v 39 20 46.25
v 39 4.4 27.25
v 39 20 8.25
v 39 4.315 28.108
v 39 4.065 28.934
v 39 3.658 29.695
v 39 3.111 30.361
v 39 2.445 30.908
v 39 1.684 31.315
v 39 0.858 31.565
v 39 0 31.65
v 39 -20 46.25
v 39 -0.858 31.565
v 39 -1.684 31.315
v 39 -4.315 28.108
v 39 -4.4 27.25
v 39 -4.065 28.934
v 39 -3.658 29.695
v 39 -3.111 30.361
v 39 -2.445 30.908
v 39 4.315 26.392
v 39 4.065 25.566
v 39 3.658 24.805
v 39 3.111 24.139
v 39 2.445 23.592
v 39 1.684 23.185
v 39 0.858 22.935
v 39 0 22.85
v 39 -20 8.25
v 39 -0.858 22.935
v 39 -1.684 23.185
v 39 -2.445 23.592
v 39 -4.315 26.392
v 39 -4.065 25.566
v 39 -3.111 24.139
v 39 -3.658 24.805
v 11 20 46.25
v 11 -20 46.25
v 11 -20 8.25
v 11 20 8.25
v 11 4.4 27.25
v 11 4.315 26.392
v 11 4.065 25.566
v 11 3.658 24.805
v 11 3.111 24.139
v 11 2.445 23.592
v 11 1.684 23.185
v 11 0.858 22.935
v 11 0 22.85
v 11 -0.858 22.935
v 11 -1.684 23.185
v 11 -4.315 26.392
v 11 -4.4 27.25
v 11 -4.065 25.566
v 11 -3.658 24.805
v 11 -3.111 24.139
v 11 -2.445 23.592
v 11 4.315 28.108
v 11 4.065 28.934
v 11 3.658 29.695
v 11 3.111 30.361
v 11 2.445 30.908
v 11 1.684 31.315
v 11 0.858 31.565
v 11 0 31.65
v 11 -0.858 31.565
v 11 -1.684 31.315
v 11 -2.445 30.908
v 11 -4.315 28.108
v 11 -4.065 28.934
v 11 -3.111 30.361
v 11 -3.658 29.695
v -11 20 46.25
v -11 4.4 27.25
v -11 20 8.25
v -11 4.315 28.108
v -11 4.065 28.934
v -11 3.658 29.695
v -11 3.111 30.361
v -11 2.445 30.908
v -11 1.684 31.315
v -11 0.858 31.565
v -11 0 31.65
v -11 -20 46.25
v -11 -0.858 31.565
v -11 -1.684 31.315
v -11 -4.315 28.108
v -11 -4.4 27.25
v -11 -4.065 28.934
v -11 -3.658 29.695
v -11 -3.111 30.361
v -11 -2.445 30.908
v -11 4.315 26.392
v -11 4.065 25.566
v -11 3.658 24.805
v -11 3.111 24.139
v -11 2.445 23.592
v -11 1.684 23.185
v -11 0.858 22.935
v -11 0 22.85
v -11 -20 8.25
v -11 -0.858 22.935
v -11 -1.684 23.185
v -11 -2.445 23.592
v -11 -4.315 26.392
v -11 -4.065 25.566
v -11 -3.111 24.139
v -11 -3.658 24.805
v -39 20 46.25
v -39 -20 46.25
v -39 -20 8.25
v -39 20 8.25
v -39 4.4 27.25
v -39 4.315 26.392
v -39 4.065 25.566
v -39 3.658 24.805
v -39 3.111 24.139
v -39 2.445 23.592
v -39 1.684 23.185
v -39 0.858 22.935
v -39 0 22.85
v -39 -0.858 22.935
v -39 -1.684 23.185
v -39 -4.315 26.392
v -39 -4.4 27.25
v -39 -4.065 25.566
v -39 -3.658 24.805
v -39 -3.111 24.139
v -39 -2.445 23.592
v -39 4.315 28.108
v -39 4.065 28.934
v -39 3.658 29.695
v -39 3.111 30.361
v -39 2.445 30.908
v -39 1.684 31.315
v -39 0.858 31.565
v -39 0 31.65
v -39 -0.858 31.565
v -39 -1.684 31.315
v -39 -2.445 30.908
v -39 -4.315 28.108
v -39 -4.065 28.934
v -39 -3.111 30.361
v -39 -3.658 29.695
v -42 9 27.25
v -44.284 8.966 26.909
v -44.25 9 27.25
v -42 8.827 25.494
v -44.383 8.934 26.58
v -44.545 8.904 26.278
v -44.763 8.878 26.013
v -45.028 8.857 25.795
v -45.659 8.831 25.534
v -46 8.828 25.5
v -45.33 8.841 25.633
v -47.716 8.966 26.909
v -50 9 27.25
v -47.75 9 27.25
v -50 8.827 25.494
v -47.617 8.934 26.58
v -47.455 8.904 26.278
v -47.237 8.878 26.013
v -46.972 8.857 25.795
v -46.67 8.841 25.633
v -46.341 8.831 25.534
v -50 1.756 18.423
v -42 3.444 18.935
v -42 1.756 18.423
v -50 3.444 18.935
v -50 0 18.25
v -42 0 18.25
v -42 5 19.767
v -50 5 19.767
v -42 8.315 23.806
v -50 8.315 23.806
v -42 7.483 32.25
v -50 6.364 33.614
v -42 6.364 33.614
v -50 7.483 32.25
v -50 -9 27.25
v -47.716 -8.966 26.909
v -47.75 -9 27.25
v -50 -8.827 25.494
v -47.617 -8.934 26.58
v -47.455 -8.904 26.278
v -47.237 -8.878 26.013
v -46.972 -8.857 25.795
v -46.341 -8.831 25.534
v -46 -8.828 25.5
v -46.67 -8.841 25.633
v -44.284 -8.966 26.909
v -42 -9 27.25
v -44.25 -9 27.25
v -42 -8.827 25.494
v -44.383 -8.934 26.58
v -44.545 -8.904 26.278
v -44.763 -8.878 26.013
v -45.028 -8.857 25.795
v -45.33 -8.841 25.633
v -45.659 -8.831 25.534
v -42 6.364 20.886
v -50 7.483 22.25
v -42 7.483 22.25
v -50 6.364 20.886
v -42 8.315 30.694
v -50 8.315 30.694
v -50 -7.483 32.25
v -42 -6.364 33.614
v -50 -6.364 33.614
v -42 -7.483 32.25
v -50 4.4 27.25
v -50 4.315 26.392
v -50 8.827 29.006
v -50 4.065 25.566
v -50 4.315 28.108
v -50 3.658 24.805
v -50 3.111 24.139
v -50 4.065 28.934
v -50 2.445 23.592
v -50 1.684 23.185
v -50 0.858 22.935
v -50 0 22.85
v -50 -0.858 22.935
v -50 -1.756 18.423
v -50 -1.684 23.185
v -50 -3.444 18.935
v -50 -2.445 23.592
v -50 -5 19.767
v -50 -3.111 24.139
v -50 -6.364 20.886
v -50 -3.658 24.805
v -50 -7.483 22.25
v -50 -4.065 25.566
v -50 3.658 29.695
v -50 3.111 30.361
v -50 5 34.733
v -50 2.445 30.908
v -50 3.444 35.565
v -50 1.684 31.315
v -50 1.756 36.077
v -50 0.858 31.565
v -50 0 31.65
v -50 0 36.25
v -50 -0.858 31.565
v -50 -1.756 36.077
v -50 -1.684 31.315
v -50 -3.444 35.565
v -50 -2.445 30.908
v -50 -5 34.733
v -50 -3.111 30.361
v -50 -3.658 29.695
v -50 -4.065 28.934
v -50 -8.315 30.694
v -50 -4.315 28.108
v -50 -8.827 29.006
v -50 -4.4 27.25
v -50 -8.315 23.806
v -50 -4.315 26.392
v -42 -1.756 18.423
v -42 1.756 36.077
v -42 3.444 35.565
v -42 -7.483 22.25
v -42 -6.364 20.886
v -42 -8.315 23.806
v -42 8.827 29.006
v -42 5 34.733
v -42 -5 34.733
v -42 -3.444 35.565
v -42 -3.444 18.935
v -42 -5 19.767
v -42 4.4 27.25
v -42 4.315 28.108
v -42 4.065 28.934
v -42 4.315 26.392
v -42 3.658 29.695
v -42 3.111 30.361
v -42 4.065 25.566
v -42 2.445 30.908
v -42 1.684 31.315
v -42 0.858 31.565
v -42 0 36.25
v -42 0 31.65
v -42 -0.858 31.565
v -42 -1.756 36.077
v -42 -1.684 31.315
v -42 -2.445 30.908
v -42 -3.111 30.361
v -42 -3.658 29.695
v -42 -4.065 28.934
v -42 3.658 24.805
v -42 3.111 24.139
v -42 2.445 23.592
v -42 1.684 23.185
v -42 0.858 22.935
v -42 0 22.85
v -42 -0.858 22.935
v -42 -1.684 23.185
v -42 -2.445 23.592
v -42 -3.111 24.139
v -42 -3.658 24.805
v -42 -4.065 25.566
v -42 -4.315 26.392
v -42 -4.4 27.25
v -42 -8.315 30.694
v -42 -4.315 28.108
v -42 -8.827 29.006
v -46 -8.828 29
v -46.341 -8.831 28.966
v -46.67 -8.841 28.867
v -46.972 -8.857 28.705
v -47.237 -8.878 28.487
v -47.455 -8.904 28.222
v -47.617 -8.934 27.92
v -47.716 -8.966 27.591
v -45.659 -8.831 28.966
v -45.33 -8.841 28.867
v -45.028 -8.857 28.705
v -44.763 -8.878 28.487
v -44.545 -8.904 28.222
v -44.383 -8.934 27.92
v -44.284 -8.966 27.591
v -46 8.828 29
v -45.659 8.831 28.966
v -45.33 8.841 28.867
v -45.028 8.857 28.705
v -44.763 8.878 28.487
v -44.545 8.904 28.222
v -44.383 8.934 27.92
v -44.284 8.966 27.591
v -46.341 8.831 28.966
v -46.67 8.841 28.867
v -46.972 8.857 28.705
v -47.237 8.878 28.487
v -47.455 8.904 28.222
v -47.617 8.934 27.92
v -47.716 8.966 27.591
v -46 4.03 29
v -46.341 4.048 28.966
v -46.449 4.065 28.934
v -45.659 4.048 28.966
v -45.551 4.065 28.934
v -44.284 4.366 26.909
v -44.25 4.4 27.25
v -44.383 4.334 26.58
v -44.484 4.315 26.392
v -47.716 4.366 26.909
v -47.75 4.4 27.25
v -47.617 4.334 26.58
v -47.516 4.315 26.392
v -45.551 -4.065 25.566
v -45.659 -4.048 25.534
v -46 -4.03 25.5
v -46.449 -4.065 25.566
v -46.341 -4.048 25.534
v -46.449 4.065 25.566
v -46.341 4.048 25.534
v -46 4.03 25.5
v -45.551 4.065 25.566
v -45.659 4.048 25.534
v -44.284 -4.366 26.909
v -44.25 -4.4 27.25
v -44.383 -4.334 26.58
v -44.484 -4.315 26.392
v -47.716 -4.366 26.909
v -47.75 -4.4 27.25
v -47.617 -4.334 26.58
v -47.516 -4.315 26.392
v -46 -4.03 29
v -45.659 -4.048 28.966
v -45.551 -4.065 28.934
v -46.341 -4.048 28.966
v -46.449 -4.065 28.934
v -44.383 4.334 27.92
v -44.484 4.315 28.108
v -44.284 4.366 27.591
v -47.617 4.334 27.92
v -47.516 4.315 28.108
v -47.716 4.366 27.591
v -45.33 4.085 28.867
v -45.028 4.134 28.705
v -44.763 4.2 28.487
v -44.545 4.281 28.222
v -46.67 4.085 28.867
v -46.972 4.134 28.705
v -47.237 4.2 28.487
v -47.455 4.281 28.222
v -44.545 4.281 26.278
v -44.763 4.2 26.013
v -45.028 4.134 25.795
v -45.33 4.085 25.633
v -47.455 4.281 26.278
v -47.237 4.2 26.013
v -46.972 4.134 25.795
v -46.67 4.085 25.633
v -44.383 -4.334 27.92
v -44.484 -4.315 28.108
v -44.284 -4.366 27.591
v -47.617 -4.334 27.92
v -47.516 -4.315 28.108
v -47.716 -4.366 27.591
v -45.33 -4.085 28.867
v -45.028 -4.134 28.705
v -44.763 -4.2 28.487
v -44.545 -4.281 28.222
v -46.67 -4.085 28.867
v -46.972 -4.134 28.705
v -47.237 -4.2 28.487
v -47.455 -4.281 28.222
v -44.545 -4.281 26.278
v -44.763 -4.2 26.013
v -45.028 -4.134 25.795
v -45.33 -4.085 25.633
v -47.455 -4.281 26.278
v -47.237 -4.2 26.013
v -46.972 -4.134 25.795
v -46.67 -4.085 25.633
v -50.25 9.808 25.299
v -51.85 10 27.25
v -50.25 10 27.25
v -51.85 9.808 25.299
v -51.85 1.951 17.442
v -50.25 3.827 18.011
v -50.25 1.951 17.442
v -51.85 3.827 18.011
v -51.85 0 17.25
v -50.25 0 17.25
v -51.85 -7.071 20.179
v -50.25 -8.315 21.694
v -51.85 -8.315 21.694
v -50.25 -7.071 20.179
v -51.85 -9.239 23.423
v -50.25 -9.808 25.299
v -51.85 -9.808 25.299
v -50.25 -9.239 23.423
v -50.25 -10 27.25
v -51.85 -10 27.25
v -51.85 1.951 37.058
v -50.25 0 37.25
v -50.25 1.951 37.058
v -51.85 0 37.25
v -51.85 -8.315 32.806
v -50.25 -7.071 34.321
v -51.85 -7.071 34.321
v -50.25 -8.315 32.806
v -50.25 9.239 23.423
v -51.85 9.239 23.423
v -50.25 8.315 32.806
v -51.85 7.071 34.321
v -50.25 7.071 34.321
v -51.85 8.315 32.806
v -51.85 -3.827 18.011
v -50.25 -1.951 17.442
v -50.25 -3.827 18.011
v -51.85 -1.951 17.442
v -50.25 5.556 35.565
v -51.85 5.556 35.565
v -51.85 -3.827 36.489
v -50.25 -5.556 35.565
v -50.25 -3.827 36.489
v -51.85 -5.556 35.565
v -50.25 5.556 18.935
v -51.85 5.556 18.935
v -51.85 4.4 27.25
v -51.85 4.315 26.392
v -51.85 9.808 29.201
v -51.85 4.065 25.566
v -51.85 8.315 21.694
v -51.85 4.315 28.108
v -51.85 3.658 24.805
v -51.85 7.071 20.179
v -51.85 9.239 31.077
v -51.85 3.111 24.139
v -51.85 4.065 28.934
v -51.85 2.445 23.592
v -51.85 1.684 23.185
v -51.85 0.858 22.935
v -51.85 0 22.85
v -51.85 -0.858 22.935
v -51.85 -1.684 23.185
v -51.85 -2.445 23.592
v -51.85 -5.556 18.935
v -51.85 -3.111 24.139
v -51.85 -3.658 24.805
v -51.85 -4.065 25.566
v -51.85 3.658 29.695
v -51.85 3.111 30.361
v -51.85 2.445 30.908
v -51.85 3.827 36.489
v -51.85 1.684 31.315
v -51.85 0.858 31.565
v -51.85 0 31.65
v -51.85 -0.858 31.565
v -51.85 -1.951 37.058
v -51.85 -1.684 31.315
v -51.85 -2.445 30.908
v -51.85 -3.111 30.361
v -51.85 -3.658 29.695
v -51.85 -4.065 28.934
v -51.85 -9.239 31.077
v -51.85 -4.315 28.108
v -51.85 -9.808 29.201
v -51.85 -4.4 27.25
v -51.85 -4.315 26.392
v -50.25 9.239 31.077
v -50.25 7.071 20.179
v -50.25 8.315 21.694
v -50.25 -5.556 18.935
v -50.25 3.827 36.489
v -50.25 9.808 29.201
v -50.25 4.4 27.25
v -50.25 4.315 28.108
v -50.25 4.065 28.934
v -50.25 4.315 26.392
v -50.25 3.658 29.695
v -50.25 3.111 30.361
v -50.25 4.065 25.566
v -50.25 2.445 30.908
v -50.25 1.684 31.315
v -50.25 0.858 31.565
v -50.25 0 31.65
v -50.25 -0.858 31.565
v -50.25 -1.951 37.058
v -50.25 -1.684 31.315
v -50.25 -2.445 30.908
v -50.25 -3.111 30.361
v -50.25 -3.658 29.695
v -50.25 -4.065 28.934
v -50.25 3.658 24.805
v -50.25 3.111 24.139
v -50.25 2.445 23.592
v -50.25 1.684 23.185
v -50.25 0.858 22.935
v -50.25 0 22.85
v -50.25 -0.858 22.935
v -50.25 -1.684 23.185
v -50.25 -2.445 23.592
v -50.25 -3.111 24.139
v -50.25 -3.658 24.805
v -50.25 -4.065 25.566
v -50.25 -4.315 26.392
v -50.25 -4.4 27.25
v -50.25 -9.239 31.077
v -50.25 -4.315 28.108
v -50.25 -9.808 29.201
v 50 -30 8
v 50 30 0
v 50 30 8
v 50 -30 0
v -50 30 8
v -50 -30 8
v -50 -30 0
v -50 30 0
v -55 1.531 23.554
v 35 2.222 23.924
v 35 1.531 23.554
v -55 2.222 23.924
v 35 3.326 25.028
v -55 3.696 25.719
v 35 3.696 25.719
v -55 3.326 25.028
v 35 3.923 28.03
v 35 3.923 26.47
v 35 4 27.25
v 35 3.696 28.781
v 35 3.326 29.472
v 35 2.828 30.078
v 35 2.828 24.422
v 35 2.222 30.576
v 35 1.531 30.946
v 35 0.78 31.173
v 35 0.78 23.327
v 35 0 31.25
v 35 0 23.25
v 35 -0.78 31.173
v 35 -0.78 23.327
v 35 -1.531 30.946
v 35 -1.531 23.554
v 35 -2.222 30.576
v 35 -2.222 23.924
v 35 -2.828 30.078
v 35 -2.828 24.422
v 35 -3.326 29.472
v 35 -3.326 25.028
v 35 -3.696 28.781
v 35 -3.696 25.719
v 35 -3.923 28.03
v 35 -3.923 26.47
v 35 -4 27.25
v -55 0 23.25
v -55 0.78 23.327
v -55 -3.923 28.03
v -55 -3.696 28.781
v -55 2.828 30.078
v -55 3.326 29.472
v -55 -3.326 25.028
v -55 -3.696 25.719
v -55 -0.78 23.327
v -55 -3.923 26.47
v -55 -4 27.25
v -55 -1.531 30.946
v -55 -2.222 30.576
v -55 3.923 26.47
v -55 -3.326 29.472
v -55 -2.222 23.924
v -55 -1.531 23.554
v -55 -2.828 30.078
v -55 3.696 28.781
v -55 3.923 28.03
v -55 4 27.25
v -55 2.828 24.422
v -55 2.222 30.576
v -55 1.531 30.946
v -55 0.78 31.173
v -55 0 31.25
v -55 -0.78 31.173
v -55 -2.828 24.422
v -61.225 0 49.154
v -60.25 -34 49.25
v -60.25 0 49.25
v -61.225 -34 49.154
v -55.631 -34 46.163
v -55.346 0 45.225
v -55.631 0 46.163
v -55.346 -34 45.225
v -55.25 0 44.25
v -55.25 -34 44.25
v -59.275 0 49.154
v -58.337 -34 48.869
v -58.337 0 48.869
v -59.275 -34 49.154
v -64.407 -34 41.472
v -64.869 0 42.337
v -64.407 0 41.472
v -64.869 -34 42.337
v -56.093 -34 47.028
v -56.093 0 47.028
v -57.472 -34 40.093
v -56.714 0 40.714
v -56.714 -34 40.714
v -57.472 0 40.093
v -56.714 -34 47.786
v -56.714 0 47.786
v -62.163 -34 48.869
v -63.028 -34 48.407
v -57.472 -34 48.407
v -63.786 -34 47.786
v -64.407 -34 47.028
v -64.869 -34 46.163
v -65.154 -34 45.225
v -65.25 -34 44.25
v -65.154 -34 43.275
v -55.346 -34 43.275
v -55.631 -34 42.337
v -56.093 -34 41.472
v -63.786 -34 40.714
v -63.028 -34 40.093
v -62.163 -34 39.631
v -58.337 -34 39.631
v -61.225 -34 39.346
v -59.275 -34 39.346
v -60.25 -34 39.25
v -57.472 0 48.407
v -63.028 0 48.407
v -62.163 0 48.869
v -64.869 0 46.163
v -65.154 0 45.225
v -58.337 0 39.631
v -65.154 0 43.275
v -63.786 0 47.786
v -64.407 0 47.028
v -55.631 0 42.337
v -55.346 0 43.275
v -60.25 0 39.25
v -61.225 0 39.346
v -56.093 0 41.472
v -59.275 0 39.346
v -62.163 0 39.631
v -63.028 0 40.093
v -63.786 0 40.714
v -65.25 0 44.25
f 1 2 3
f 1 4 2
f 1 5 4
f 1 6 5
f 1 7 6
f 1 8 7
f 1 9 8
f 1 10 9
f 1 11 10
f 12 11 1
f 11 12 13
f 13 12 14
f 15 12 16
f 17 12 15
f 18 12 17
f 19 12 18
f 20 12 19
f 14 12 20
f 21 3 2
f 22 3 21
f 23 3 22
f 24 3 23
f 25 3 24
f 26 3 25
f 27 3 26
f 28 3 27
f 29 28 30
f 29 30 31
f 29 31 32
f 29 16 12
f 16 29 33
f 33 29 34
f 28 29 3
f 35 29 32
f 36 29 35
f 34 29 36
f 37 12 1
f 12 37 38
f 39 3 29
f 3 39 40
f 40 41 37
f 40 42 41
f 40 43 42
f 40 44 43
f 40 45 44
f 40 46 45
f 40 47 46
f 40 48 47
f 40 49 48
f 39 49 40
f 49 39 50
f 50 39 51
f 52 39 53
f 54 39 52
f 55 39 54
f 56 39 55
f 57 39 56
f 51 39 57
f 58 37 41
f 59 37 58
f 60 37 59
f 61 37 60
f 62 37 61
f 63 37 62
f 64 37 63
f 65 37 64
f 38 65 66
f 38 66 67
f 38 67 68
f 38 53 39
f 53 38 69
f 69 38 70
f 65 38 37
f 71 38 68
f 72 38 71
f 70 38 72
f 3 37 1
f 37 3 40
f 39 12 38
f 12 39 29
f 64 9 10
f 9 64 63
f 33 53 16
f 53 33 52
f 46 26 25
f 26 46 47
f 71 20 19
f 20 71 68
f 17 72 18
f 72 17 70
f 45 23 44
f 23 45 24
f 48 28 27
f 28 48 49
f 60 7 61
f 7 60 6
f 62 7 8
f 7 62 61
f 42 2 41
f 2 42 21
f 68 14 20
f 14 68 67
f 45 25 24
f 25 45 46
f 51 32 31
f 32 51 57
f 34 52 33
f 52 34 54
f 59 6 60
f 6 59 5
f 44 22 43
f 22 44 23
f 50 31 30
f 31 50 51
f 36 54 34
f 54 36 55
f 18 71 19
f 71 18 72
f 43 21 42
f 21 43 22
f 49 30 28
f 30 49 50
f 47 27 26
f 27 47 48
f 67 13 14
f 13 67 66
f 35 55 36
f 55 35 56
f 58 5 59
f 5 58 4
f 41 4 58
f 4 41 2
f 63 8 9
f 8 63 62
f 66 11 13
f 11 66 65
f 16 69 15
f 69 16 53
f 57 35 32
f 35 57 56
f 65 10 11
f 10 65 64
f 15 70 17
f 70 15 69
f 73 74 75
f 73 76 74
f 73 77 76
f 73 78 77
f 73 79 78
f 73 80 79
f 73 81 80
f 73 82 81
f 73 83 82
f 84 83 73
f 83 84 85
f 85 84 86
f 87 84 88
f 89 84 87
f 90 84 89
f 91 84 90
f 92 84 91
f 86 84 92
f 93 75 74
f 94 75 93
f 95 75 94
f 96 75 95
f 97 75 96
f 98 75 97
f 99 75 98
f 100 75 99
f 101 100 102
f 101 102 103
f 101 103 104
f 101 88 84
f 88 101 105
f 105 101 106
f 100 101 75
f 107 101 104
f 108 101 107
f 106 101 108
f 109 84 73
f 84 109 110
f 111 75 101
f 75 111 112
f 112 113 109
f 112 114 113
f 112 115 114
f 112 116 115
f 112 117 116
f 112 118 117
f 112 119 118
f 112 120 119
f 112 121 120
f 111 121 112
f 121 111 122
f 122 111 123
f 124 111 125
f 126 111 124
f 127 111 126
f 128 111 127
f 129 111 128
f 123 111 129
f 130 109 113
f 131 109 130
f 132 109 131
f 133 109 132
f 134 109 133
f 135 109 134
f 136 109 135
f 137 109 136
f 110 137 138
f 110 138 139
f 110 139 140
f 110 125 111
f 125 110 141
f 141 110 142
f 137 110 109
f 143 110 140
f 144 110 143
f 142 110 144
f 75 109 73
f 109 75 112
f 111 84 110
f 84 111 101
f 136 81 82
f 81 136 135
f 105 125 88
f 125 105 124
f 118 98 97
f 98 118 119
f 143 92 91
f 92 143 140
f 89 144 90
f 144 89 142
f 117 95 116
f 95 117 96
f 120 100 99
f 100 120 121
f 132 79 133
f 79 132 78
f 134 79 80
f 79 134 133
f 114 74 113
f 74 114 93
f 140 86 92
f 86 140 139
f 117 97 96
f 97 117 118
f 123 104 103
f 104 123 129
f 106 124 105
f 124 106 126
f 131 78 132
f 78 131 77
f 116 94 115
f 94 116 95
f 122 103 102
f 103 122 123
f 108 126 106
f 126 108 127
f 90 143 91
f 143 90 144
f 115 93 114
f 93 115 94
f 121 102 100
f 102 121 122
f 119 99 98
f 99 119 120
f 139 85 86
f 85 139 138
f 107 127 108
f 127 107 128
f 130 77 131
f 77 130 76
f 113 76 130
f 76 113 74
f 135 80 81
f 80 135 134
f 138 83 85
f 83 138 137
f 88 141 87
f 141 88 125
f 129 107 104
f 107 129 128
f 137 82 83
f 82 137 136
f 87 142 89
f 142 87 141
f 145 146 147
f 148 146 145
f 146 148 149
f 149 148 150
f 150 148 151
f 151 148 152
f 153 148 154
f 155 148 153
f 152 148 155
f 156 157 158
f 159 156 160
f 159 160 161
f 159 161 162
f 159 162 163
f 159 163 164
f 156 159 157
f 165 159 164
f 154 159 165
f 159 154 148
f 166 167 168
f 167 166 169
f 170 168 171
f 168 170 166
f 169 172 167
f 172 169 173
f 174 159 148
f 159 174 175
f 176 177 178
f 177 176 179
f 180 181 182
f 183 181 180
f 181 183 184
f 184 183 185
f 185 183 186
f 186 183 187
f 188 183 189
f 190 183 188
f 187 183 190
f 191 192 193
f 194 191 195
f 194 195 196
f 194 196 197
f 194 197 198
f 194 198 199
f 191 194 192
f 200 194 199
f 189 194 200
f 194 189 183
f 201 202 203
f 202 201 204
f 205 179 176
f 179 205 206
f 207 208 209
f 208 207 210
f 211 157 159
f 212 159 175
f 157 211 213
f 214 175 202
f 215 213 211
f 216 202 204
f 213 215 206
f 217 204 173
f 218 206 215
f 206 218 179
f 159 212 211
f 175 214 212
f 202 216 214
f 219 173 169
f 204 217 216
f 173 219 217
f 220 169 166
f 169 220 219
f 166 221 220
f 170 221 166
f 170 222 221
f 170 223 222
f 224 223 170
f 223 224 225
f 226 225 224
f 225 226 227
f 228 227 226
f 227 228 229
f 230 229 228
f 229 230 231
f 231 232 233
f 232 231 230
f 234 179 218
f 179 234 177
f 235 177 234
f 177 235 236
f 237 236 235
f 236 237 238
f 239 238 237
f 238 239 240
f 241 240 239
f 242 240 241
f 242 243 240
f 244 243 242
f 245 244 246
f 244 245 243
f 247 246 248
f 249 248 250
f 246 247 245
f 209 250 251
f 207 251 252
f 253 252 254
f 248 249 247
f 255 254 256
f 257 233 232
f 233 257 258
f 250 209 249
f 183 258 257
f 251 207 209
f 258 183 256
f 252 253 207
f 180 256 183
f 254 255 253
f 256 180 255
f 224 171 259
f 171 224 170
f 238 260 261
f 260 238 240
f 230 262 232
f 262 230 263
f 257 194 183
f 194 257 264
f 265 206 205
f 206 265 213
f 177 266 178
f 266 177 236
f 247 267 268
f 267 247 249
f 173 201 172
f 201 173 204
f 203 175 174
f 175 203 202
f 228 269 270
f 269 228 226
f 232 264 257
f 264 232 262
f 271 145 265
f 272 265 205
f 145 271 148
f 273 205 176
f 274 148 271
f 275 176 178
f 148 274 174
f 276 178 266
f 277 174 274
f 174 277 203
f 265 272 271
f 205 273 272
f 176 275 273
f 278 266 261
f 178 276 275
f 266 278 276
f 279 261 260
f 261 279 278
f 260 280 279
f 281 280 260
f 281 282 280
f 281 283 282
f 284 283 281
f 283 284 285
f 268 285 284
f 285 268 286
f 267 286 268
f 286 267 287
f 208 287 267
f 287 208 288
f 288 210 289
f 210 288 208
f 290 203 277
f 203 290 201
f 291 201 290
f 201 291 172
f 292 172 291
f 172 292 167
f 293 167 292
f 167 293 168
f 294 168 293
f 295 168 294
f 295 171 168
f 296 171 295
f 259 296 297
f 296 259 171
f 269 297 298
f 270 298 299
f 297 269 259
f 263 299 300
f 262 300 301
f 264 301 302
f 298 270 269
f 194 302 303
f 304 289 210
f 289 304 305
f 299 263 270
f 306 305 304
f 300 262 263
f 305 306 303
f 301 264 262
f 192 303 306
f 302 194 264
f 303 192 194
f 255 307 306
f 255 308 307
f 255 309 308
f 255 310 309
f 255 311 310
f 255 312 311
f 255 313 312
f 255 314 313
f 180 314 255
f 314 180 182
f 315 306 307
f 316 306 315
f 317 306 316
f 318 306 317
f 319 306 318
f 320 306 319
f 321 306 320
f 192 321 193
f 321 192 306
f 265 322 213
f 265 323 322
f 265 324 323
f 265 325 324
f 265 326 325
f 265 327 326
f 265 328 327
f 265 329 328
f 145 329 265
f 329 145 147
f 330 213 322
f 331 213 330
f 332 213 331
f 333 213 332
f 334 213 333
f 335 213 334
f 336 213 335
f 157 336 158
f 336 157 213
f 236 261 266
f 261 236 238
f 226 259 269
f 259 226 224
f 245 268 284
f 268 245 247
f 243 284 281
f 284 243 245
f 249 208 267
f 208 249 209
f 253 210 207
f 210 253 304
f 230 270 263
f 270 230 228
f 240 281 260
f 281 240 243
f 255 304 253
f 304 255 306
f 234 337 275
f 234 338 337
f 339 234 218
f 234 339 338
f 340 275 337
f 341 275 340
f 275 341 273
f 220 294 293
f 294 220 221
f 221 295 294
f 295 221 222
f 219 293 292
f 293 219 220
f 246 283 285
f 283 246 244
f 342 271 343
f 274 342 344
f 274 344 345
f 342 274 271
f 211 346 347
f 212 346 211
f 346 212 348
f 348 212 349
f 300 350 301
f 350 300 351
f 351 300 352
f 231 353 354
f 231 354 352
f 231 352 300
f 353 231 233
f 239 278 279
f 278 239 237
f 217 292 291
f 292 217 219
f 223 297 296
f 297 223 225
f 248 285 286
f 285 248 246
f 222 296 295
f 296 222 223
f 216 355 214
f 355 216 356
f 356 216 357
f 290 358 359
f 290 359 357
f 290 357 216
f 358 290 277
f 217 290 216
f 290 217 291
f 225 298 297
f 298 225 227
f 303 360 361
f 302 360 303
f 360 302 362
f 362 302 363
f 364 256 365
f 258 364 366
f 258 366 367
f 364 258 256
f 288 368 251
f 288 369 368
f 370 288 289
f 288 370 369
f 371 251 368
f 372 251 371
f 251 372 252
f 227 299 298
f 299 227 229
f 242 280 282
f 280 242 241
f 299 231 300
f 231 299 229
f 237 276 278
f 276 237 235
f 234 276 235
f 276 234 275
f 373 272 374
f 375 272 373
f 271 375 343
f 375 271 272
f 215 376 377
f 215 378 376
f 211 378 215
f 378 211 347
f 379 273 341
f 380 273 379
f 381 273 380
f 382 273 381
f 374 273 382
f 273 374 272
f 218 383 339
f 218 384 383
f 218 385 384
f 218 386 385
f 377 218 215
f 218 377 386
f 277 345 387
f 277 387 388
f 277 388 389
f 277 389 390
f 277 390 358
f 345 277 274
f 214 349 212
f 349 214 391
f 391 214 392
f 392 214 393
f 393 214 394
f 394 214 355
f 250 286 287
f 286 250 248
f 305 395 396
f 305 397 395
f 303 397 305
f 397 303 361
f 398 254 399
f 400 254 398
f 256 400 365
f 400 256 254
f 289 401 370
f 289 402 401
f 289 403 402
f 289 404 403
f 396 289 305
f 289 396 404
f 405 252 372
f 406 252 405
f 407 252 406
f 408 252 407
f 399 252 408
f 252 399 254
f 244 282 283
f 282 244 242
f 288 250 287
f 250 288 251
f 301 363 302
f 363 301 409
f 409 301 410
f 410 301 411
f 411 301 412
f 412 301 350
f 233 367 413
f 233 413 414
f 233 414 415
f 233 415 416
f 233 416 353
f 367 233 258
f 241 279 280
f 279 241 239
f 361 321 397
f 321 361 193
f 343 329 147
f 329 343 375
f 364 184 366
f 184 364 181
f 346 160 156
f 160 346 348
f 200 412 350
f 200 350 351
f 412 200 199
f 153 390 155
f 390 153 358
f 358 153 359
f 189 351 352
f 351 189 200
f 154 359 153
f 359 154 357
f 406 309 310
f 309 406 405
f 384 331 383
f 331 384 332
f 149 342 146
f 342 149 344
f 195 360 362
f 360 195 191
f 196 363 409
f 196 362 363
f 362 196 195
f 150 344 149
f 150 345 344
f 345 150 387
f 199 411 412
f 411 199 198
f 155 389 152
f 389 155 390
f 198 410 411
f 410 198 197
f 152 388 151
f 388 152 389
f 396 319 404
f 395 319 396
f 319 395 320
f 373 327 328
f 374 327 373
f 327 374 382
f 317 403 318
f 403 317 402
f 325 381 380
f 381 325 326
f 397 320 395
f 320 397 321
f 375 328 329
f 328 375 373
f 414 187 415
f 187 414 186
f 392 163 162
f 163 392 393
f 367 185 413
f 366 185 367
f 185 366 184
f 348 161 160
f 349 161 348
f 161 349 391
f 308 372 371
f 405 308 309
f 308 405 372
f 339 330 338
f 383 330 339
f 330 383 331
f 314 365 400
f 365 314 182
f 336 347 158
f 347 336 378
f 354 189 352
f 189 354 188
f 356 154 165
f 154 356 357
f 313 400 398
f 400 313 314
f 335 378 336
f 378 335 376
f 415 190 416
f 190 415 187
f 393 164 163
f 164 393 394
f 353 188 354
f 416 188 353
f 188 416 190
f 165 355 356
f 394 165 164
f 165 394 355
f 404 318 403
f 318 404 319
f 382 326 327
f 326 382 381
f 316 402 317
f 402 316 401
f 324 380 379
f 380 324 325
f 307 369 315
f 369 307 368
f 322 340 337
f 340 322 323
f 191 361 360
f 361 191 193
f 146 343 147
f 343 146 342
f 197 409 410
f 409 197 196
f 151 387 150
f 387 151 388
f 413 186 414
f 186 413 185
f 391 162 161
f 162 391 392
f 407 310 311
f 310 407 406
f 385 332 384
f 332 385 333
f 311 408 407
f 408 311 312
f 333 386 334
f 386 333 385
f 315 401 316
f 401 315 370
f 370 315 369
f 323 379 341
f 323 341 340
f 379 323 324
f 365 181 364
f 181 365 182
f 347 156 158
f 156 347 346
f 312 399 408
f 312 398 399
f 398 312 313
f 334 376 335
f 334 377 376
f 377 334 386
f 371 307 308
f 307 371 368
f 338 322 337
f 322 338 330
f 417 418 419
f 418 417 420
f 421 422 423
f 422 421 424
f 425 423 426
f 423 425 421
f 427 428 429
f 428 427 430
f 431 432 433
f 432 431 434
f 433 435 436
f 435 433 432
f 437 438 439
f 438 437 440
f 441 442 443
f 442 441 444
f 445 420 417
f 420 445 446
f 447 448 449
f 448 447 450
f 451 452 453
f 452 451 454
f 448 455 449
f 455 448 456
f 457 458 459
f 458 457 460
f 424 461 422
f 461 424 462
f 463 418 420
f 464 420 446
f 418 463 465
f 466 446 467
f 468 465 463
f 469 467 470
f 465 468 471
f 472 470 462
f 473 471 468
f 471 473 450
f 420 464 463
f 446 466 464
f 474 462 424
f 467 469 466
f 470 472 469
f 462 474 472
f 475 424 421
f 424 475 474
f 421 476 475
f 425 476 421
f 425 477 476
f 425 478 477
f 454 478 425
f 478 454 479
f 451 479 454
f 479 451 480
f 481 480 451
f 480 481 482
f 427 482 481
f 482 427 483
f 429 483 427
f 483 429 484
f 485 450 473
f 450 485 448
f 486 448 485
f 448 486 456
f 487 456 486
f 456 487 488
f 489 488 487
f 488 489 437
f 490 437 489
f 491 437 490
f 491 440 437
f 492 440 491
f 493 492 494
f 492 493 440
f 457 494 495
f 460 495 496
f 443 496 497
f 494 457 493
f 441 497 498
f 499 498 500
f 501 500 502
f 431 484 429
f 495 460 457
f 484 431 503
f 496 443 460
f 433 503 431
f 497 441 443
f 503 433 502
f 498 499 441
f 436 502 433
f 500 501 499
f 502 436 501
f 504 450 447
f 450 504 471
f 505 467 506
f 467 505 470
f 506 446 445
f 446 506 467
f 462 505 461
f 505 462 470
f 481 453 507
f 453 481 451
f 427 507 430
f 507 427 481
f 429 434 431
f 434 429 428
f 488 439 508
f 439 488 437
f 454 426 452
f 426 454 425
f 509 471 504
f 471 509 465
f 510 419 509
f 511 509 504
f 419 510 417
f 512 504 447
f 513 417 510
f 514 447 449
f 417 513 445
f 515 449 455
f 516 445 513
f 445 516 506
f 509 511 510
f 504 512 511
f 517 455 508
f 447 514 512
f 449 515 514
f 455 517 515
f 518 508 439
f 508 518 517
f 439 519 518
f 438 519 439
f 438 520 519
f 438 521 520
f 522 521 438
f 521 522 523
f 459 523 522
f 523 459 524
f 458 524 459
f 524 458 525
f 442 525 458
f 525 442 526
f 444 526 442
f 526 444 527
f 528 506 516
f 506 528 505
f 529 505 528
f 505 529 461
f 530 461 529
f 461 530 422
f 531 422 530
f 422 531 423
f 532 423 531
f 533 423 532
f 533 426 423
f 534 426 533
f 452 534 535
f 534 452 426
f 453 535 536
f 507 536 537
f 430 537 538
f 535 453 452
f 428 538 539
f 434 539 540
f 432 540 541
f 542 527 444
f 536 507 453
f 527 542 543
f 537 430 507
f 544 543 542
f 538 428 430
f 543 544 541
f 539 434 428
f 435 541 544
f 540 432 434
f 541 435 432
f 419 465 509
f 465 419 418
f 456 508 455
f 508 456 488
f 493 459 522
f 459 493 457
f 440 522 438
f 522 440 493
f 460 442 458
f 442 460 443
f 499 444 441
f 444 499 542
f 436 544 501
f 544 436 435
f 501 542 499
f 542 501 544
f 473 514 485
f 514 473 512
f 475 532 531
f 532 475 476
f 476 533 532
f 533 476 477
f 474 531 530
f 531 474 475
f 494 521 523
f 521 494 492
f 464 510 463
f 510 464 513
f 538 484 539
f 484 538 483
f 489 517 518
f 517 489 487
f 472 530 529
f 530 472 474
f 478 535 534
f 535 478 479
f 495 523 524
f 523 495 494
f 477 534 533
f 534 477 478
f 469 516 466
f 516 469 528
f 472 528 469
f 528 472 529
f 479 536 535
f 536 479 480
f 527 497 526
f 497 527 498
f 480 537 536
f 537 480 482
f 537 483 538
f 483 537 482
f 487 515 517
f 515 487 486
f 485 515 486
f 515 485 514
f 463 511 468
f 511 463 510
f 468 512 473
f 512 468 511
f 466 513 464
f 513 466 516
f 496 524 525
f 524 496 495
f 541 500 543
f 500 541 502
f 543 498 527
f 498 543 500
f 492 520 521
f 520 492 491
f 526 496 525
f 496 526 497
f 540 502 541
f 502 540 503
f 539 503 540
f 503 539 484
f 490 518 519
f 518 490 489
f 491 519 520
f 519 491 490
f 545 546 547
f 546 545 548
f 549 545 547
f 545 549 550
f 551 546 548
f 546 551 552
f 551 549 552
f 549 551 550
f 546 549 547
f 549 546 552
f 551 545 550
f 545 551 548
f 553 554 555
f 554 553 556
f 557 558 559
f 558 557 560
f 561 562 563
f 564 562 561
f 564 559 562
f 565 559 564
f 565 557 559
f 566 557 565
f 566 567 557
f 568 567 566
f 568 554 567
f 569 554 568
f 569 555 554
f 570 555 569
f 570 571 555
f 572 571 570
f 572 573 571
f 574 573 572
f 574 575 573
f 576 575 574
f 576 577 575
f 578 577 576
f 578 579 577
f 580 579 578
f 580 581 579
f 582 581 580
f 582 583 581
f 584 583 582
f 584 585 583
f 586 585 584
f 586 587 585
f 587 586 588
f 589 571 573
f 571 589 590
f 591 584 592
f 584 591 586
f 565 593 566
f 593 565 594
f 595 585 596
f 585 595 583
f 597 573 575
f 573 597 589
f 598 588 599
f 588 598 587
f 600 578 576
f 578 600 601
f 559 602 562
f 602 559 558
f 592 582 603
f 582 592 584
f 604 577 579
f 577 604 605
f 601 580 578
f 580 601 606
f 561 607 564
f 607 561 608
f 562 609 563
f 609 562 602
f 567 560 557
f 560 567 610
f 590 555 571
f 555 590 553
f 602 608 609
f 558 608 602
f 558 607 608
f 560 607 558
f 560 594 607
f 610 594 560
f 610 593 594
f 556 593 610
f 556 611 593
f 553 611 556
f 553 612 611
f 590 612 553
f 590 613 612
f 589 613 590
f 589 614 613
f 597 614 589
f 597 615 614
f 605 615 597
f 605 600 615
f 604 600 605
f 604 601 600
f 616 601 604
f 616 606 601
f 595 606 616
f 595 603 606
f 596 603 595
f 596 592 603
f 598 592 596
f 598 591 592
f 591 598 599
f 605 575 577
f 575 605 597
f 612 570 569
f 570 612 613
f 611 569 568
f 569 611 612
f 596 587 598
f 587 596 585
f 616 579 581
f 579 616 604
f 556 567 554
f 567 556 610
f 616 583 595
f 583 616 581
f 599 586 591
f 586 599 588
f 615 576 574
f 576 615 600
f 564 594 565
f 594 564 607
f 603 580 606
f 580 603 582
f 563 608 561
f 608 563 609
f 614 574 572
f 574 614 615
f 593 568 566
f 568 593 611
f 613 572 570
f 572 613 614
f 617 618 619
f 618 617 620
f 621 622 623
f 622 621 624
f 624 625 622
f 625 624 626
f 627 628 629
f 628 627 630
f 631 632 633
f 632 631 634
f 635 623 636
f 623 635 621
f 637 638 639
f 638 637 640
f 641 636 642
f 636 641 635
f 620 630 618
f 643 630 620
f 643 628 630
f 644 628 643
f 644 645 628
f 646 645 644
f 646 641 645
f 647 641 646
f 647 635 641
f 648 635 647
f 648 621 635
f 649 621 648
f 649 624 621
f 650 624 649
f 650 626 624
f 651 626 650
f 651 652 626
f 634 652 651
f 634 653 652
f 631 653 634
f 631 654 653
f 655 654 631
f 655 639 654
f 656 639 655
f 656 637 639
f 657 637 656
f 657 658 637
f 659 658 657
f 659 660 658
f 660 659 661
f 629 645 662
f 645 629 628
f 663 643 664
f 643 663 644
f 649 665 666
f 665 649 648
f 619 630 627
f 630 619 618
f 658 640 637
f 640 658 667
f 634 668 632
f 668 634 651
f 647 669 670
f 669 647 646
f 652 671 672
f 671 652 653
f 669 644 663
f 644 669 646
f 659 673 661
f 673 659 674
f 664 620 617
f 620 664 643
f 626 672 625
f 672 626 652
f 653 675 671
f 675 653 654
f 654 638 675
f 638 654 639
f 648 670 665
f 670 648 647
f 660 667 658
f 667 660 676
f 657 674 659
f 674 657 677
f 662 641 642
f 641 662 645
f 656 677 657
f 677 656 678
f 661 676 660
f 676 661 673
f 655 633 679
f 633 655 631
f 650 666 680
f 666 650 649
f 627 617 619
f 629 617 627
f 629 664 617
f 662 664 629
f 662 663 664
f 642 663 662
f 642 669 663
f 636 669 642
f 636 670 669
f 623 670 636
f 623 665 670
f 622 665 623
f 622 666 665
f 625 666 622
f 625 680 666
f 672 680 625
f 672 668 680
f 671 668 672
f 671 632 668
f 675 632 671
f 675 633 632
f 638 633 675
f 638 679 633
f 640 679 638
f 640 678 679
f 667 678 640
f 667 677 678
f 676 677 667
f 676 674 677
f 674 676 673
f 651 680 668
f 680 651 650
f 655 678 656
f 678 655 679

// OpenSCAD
$fn = 32;

// ------------------------------------------------------------------------
// Machine vise: screw d8, jaws 28 x 38 mm
// Every part is its own module, assembly() places every instance.
// ------------------------------------------------------------------------

// --- part 1 ---
module vise_bed() {
  difference() {
    translate([-50, -30, 0]) cube([100, 60, 8]);
  }
}

// --- part 2 ---
module vise_jaw() {
  difference() {
    translate([-14, -20, 0]) cube([28, 40, 38]);
    translate([0, 0, 19]) rotate([0, 90, 0]) cylinder(h = 30, d = 8.8, center = true);
  }
}

// --- part 3 ---
module vise_screw() {
  translate([0, 0, -45]) cylinder(h = 90, d = 8);
}

// --- part 4 ---
module screw_collar() {
  difference() {
    cylinder(h = 8, d = 18);
    translate([0, 0, -1]) cylinder(h = 10, d = 8.8);
    translate([0, 0, 4]) rotate([90, 0, 0]) cylinder(h = 20, d = 3.5, center = true);
  }
}

// --- part 5 ---
module screw_washer() {
  difference() {
      translate([0, 0, 0]) cylinder(h = 1.6, d = 20);
      translate([0, 0, -1]) cylinder(h = 3.6, d = 8.8);
    }
}

// --- part 6 ---
module vise_handle() {
  cylinder(h = 34, d = 10);
}

// --- assembly ---
module assembly() {
  color([0.80, 0.24, 0.20]) translate([0, 0, 0]) rotate([0, 0, 0]) vise_bed();
  color([0.20, 0.45, 0.75]) translate([25, 0, 8.25]) rotate([0, 0, 0]) vise_jaw();
  color([0.25, 0.62, 0.32]) translate([-25, 0, 8.25]) rotate([0, 0, 0]) vise_jaw();
  color([0.92, 0.70, 0.18]) translate([-10, 0, 27.25]) rotate([0, 90, 0]) vise_screw();
  color([0.58, 0.35, 0.70]) translate([-50, 0, 27.25]) rotate([0, 90, 0]) screw_collar();
  color([0.16, 0.66, 0.66]) translate([-51.85, 0, 27.25]) rotate([0, 90, 0]) screw_washer();
  color([0.85, 0.48, 0.18]) translate([-60.25, 0, 44.25]) rotate([90, 0, 0]) vise_handle();
}

assembly();
